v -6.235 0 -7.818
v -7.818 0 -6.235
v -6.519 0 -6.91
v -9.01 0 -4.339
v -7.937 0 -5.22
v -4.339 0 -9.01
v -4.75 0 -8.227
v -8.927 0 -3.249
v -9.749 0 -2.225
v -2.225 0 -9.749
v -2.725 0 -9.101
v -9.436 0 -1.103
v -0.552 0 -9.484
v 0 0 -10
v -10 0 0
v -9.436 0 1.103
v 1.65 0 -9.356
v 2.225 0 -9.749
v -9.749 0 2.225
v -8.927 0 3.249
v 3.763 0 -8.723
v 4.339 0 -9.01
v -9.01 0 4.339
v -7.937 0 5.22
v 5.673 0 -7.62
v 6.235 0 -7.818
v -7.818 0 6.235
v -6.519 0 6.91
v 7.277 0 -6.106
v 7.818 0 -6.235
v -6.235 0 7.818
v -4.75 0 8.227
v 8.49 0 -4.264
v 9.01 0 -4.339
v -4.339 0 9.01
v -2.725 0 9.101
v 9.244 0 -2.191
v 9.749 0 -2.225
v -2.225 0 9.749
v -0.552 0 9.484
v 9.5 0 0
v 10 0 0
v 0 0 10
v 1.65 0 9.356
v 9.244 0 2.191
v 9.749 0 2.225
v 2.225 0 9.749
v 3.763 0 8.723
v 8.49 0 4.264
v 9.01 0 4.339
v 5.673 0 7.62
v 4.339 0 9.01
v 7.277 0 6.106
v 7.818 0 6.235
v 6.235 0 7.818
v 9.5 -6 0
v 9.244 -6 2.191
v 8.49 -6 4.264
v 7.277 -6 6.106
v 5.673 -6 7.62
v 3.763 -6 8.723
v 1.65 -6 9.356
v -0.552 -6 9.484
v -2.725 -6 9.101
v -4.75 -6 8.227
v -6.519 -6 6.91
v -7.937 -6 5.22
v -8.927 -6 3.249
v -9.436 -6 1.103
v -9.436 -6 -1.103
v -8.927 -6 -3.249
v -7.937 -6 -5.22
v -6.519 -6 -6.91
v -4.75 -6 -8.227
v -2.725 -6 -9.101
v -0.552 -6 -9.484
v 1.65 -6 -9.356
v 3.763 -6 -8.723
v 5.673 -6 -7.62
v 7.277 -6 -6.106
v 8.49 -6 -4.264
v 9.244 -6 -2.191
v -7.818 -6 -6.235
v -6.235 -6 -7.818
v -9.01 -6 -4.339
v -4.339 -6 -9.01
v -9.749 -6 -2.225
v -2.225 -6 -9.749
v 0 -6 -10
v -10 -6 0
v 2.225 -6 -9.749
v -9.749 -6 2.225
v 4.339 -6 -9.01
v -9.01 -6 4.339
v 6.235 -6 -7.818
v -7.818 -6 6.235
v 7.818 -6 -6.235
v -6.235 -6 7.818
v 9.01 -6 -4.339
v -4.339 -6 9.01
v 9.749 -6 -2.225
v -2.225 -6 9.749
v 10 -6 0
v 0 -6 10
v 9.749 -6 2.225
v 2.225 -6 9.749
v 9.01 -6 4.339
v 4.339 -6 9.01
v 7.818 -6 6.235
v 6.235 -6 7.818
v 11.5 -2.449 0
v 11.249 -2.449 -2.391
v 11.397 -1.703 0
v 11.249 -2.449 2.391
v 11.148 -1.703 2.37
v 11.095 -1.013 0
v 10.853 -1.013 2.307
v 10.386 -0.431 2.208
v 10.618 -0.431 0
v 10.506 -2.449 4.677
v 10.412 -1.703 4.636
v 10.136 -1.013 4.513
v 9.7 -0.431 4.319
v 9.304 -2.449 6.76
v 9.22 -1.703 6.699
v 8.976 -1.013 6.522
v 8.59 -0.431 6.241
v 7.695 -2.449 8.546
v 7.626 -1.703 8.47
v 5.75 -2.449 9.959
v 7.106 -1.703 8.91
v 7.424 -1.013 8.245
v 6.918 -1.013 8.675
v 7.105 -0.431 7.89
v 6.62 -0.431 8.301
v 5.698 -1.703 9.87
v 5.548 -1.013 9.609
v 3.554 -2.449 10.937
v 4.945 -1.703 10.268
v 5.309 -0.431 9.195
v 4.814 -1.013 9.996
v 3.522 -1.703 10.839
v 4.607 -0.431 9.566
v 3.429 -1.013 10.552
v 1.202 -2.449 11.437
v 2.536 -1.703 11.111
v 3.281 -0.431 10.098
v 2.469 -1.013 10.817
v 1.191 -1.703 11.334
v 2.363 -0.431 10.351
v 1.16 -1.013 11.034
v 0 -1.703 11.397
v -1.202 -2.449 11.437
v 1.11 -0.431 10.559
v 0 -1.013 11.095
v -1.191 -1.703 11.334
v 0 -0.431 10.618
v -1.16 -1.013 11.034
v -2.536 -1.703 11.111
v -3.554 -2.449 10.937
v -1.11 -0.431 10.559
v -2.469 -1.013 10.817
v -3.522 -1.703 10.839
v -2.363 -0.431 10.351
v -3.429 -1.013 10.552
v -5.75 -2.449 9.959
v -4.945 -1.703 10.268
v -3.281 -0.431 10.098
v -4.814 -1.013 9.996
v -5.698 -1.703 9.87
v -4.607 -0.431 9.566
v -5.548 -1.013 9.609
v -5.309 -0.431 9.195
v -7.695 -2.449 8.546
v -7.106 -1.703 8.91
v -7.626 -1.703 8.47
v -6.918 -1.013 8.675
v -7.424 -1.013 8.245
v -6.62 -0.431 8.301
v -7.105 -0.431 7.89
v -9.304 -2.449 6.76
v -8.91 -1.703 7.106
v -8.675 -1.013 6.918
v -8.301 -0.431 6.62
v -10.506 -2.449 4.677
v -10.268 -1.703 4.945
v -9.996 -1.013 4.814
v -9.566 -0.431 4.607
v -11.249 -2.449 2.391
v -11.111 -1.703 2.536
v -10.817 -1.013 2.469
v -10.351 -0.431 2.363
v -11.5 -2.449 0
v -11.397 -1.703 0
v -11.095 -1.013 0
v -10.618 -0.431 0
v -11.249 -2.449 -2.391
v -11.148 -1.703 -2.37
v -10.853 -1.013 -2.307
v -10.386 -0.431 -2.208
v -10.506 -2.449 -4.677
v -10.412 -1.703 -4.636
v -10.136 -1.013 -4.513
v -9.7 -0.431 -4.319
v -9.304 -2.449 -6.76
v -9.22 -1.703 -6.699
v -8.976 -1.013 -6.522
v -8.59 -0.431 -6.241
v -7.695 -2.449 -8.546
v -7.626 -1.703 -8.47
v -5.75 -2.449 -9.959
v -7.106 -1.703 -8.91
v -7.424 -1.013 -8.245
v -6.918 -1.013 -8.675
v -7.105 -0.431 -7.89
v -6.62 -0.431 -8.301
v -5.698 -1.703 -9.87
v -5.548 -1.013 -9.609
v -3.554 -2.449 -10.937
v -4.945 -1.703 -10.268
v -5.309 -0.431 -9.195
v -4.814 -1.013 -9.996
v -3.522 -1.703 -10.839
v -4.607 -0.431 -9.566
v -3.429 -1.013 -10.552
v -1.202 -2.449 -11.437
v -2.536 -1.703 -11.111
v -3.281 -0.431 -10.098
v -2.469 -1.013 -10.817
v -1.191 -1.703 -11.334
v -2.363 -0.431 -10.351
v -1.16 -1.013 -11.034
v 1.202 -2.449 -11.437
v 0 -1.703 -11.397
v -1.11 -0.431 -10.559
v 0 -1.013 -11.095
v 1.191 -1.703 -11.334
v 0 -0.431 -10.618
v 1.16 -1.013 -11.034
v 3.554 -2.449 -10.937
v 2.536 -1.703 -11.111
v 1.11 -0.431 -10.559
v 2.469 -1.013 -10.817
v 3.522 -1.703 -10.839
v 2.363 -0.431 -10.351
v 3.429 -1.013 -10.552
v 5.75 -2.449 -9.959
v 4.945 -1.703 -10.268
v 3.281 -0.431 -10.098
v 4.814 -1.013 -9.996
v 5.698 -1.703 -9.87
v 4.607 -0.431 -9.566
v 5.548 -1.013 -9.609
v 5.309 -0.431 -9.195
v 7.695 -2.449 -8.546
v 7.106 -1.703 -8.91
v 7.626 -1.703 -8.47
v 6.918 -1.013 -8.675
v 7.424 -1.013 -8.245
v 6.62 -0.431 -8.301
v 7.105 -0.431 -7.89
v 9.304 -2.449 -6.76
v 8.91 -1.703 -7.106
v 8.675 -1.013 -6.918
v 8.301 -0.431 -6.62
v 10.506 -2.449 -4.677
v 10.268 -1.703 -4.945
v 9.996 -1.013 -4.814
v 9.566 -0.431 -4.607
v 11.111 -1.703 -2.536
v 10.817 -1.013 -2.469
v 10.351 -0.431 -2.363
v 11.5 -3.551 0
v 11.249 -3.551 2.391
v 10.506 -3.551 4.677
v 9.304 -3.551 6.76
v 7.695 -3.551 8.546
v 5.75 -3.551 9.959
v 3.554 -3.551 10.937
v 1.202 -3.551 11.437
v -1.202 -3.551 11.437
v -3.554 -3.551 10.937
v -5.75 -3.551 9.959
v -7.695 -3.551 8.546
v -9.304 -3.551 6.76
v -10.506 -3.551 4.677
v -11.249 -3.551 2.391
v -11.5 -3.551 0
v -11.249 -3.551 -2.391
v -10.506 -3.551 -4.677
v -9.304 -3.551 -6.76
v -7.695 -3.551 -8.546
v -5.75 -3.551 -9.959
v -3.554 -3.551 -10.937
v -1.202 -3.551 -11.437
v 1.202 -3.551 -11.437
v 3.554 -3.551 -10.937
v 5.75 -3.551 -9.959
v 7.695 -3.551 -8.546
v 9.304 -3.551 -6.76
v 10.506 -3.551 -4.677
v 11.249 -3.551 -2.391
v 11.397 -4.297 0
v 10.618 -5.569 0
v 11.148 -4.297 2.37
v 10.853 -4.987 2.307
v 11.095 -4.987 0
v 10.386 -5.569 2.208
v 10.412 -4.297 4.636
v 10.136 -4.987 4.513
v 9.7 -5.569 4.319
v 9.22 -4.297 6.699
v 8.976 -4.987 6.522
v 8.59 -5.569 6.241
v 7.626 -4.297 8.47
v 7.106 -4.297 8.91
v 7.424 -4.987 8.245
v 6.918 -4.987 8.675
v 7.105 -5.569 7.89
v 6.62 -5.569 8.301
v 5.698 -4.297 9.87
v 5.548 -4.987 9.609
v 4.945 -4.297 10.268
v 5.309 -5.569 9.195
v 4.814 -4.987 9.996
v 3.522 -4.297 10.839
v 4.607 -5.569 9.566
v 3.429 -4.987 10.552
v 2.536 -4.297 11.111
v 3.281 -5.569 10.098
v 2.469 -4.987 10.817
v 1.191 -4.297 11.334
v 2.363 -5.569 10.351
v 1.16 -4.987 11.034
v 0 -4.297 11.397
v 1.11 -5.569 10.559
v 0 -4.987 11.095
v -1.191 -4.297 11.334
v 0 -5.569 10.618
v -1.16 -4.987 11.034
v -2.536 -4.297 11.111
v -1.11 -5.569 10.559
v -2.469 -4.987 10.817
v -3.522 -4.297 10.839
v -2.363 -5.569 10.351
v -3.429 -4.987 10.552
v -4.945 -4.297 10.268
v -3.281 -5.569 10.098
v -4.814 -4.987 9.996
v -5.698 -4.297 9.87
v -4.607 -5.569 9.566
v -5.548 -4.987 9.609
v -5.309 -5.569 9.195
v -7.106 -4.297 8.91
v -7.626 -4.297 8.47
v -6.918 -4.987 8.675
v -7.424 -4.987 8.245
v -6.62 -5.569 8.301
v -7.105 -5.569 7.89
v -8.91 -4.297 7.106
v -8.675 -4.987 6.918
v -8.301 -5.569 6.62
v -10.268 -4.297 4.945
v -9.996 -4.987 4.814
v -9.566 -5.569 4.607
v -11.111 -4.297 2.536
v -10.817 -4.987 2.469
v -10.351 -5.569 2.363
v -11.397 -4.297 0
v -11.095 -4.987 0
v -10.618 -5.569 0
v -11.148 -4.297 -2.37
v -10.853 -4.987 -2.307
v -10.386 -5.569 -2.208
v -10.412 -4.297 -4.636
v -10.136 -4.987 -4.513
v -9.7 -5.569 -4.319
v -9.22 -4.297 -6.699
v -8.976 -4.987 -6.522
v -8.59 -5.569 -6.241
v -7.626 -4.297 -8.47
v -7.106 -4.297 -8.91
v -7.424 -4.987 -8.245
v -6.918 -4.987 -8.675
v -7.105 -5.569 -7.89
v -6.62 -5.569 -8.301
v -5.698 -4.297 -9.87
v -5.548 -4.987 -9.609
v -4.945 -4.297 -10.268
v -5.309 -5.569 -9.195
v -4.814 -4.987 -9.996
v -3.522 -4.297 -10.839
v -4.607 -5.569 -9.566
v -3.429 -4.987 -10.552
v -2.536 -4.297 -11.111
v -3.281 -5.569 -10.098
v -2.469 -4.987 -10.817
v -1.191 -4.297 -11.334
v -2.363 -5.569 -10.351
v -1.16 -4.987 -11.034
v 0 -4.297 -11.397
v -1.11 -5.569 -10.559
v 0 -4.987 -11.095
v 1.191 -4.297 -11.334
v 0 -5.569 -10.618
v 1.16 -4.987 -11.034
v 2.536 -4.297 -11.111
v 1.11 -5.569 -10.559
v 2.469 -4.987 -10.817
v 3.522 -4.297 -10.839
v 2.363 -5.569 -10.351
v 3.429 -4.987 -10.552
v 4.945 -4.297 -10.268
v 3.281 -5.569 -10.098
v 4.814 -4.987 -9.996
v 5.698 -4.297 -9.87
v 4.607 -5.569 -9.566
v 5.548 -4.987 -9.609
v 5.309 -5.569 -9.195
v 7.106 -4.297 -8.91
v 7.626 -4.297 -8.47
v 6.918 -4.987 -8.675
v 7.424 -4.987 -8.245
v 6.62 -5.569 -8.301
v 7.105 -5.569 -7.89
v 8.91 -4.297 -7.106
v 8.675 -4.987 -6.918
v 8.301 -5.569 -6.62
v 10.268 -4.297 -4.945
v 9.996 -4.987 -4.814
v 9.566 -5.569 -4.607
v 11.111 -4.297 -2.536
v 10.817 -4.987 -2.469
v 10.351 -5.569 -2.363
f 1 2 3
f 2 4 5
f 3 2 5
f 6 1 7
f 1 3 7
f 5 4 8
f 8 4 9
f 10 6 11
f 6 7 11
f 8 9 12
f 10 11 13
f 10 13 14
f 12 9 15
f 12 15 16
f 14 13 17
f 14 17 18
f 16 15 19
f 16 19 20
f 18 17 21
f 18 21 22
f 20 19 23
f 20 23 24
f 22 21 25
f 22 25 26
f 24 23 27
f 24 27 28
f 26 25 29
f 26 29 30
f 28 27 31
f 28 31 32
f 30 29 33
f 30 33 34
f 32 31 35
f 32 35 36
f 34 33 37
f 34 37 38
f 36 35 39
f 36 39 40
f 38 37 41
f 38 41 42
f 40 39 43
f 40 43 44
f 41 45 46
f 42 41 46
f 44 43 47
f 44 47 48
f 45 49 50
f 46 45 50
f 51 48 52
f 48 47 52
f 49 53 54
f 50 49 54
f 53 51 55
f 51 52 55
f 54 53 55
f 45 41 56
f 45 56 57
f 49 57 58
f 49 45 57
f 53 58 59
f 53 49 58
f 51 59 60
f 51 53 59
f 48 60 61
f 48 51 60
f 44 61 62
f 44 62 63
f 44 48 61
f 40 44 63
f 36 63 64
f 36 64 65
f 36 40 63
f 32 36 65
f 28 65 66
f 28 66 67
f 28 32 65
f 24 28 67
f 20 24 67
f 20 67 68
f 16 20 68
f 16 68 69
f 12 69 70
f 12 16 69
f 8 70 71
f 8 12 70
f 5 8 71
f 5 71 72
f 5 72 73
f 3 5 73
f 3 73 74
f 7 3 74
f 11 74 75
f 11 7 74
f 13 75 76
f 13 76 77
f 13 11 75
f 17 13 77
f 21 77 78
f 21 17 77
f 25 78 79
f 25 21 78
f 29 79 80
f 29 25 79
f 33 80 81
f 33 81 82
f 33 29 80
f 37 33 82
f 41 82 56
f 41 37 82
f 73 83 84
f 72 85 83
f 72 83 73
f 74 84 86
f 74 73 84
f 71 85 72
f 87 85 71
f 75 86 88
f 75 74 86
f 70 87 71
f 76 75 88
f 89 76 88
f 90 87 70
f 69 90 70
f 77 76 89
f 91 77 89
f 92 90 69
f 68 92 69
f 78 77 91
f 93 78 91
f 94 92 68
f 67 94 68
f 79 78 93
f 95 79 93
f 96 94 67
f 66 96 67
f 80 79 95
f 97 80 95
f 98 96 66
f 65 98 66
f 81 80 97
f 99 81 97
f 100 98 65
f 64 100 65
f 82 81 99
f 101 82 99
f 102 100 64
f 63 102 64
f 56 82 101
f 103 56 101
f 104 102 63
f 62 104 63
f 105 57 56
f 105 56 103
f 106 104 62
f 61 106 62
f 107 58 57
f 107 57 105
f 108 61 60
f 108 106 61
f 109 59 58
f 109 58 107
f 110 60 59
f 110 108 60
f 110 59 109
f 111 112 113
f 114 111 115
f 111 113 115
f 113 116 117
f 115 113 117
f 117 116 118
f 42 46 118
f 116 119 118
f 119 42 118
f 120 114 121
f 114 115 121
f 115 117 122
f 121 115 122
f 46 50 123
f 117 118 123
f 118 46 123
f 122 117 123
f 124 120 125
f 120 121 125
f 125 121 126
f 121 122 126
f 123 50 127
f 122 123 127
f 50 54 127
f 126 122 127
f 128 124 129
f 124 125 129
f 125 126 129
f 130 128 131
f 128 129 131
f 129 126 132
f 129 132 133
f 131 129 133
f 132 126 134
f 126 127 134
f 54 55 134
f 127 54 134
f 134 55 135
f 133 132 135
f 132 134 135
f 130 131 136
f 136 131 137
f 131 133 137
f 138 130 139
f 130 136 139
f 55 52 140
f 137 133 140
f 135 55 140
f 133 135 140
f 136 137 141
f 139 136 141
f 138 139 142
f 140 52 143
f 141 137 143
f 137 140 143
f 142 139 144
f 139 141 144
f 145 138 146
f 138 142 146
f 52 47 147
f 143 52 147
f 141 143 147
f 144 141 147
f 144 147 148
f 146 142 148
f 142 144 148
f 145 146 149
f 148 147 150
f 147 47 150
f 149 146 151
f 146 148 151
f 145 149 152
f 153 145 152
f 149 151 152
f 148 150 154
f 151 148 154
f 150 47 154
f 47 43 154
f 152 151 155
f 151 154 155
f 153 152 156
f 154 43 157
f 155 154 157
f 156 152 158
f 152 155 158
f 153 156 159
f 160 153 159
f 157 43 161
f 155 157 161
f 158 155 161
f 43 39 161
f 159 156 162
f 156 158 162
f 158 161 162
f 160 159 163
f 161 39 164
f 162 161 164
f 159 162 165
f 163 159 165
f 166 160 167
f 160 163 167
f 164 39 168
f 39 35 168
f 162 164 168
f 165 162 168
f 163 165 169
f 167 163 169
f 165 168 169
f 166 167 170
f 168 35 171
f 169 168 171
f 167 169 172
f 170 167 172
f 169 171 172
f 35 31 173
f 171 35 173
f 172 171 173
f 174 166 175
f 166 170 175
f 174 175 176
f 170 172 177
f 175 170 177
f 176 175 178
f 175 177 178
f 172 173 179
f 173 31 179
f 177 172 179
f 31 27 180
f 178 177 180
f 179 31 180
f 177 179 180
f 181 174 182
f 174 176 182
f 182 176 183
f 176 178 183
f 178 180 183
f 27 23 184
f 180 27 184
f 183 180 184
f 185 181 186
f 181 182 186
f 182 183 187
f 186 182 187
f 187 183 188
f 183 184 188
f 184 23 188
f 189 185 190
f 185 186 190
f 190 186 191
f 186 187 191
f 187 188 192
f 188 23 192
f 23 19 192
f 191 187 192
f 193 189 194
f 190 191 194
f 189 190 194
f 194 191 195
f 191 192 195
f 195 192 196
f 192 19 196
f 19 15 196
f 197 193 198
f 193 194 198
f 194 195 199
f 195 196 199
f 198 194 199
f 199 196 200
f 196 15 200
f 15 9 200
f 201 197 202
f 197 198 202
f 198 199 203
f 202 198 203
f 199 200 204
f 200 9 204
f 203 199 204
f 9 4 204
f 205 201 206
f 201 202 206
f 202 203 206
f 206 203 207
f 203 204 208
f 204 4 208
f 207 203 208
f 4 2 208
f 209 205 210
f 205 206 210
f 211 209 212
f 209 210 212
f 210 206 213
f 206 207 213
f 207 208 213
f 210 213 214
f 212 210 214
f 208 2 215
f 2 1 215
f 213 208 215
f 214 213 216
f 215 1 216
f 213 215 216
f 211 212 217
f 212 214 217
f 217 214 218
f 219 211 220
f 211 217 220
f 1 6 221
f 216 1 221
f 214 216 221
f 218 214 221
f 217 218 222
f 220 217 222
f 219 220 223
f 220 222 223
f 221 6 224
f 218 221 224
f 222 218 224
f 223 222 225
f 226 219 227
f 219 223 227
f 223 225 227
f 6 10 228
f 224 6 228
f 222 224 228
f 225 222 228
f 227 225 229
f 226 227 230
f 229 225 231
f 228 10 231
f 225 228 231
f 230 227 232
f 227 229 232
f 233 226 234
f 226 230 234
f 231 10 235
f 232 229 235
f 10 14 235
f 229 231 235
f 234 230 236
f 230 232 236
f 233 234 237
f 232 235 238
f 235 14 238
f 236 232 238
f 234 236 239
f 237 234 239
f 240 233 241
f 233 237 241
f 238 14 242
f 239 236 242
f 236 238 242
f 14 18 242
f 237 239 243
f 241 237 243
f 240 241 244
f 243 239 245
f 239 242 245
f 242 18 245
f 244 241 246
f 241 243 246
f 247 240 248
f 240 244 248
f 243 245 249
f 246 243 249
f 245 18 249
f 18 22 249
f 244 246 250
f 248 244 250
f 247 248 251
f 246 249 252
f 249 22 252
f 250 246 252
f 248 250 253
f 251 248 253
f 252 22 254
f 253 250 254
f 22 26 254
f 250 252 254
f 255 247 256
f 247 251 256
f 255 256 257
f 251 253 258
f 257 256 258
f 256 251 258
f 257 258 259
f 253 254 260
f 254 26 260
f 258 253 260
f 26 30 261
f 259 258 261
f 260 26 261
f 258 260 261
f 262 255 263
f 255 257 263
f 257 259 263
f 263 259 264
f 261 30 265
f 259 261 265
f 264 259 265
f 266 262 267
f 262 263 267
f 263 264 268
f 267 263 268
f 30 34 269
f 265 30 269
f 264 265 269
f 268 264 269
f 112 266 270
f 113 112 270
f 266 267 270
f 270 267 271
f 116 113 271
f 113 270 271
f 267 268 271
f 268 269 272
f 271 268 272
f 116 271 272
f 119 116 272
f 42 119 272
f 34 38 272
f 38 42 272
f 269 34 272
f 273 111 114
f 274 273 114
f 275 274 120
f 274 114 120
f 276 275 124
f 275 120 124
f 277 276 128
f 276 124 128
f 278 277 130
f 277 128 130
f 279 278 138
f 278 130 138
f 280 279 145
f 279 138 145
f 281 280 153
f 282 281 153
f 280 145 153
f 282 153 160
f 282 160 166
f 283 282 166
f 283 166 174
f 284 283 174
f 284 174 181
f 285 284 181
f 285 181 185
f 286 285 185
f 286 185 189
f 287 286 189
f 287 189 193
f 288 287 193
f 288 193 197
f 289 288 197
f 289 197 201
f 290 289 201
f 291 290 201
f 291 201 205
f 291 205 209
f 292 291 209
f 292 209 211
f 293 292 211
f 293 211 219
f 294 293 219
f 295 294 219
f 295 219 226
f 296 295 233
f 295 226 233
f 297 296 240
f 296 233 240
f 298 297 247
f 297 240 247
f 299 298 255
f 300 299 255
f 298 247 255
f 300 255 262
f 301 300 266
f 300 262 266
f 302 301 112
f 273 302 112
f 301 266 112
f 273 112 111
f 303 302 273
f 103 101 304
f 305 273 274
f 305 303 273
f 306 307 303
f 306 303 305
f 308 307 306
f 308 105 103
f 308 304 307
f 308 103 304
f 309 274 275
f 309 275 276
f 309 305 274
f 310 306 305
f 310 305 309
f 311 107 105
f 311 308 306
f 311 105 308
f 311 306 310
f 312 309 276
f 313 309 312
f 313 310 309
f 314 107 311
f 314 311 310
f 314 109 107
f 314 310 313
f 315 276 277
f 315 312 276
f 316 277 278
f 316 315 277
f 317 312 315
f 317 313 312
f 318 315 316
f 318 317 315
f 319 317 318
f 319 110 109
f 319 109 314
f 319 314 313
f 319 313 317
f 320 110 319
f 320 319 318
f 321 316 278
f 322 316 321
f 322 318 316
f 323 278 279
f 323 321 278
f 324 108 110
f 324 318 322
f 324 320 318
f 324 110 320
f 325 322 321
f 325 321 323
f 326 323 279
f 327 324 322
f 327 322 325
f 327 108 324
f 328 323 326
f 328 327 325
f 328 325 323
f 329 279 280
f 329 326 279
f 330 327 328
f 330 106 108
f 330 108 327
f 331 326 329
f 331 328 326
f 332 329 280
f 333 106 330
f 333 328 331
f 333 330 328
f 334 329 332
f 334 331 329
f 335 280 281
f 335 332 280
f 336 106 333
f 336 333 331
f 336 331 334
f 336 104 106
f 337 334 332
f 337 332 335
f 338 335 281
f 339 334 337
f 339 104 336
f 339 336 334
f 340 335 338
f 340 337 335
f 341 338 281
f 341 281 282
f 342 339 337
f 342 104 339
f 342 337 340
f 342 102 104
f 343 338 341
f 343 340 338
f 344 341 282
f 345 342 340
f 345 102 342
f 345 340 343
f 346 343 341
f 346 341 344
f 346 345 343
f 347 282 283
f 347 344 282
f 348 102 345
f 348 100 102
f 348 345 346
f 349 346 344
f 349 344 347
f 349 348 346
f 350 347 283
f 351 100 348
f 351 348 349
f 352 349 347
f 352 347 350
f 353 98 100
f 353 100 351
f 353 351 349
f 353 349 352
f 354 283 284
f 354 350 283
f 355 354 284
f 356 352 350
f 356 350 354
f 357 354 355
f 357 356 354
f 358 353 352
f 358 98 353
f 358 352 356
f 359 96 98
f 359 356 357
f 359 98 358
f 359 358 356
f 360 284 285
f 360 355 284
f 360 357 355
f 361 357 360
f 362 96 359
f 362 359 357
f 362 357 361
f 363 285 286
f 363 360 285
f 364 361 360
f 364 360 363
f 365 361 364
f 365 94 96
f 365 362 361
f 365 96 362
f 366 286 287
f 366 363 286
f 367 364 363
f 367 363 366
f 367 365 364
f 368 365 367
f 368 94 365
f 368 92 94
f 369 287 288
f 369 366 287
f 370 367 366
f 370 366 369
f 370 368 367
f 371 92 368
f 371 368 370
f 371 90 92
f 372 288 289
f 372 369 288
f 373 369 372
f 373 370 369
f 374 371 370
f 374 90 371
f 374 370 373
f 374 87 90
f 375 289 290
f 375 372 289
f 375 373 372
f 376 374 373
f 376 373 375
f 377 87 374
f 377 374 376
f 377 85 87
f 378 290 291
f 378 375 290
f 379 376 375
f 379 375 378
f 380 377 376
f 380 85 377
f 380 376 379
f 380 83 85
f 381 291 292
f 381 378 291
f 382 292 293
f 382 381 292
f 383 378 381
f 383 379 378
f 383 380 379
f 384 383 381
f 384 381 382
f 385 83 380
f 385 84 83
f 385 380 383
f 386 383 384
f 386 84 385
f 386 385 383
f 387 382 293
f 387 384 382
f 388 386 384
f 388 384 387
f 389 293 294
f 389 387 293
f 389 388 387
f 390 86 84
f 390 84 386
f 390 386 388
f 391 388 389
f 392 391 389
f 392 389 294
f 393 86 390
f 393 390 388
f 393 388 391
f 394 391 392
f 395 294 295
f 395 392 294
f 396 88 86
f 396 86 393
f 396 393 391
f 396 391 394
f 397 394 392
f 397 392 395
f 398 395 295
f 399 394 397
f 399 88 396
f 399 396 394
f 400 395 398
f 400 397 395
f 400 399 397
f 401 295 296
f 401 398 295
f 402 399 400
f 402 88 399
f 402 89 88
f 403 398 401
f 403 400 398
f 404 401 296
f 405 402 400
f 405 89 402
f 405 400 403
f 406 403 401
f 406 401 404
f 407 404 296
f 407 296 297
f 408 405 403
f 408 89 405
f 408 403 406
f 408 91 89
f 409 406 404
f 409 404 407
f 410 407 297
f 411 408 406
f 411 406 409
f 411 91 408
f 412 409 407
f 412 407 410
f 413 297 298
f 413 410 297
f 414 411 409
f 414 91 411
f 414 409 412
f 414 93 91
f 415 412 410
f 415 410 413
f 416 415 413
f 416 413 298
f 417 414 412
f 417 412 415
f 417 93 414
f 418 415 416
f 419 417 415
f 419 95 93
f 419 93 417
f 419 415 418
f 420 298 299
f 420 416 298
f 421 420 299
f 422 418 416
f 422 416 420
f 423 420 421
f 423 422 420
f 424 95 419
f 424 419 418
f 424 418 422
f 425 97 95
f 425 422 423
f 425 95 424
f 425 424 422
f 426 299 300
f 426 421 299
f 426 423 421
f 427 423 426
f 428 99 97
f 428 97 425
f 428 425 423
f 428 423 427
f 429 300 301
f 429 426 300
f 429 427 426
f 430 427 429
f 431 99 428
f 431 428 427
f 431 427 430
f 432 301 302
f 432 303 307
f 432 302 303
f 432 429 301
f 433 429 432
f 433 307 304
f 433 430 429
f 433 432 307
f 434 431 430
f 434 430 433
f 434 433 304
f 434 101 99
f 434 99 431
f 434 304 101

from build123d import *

# Parameters (mm, degrees)
F0_R     = 11.5
F0_R_2   = 10
F1_DEPTH = 6
F0_R_3   = 9.5
F3_DEPTH = 6


# Not quite as in the source:
# - a fillet or chamfer that OpenCascade refuses, or shapes differently, is made with other operations: its cross-section is extruded or revolved along the edge and cut away or added


with BuildPart() as f1:
    # F0 (on Front) → F1 (new body)
    with BuildSketch(Plane.XZ):
        Circle(F0_R)
        Circle(F0_R_2, mode=Mode.SUBTRACT)
    extrude(amount=F1_DEPTH)

    # F2: fillet of radius 2.75 on 3 edges, made by hand

    # F2_s1 → F2_t2 (revolve, cut)
    with BuildSketch(Plane.XY):
        with BuildLine():
            ThreePointArc((11.5, -2.4494897428), (11.0952078799, -1.0133490811), (10, 0))
            Line((10, 0), (11.5, 0))
            Line((11.5, 0), (11.5, -2.4494897428))
        make_face()
    revolve(axis=Axis((0, 0, 0), (0, -1, 0)), mode=Mode.SUBTRACT)

    # F2_s3 → F2_t4 (revolve, cut)
    with BuildSketch(Plane.XY):
        with BuildLine():
            ThreePointArc((11.5, -3.5505102572), (11.0952078799, -4.9866509189), (10, -6))
            Line((10, -6), (11.5, -6))
            Line((11.5, -6), (11.5, -3.5505102572))
        make_face()
    revolve(axis=Axis((0, -6, 0), (0, -1, 0)), mode=Mode.SUBTRACT)

    # F0 (on Front) → F3 (join)
    with BuildSketch(Plane.XZ):
        Circle(F0_R_2)
        Circle(F0_R_3, mode=Mode.SUBTRACT)
    extrude(amount=F3_DEPTH)


solid = f1.part
